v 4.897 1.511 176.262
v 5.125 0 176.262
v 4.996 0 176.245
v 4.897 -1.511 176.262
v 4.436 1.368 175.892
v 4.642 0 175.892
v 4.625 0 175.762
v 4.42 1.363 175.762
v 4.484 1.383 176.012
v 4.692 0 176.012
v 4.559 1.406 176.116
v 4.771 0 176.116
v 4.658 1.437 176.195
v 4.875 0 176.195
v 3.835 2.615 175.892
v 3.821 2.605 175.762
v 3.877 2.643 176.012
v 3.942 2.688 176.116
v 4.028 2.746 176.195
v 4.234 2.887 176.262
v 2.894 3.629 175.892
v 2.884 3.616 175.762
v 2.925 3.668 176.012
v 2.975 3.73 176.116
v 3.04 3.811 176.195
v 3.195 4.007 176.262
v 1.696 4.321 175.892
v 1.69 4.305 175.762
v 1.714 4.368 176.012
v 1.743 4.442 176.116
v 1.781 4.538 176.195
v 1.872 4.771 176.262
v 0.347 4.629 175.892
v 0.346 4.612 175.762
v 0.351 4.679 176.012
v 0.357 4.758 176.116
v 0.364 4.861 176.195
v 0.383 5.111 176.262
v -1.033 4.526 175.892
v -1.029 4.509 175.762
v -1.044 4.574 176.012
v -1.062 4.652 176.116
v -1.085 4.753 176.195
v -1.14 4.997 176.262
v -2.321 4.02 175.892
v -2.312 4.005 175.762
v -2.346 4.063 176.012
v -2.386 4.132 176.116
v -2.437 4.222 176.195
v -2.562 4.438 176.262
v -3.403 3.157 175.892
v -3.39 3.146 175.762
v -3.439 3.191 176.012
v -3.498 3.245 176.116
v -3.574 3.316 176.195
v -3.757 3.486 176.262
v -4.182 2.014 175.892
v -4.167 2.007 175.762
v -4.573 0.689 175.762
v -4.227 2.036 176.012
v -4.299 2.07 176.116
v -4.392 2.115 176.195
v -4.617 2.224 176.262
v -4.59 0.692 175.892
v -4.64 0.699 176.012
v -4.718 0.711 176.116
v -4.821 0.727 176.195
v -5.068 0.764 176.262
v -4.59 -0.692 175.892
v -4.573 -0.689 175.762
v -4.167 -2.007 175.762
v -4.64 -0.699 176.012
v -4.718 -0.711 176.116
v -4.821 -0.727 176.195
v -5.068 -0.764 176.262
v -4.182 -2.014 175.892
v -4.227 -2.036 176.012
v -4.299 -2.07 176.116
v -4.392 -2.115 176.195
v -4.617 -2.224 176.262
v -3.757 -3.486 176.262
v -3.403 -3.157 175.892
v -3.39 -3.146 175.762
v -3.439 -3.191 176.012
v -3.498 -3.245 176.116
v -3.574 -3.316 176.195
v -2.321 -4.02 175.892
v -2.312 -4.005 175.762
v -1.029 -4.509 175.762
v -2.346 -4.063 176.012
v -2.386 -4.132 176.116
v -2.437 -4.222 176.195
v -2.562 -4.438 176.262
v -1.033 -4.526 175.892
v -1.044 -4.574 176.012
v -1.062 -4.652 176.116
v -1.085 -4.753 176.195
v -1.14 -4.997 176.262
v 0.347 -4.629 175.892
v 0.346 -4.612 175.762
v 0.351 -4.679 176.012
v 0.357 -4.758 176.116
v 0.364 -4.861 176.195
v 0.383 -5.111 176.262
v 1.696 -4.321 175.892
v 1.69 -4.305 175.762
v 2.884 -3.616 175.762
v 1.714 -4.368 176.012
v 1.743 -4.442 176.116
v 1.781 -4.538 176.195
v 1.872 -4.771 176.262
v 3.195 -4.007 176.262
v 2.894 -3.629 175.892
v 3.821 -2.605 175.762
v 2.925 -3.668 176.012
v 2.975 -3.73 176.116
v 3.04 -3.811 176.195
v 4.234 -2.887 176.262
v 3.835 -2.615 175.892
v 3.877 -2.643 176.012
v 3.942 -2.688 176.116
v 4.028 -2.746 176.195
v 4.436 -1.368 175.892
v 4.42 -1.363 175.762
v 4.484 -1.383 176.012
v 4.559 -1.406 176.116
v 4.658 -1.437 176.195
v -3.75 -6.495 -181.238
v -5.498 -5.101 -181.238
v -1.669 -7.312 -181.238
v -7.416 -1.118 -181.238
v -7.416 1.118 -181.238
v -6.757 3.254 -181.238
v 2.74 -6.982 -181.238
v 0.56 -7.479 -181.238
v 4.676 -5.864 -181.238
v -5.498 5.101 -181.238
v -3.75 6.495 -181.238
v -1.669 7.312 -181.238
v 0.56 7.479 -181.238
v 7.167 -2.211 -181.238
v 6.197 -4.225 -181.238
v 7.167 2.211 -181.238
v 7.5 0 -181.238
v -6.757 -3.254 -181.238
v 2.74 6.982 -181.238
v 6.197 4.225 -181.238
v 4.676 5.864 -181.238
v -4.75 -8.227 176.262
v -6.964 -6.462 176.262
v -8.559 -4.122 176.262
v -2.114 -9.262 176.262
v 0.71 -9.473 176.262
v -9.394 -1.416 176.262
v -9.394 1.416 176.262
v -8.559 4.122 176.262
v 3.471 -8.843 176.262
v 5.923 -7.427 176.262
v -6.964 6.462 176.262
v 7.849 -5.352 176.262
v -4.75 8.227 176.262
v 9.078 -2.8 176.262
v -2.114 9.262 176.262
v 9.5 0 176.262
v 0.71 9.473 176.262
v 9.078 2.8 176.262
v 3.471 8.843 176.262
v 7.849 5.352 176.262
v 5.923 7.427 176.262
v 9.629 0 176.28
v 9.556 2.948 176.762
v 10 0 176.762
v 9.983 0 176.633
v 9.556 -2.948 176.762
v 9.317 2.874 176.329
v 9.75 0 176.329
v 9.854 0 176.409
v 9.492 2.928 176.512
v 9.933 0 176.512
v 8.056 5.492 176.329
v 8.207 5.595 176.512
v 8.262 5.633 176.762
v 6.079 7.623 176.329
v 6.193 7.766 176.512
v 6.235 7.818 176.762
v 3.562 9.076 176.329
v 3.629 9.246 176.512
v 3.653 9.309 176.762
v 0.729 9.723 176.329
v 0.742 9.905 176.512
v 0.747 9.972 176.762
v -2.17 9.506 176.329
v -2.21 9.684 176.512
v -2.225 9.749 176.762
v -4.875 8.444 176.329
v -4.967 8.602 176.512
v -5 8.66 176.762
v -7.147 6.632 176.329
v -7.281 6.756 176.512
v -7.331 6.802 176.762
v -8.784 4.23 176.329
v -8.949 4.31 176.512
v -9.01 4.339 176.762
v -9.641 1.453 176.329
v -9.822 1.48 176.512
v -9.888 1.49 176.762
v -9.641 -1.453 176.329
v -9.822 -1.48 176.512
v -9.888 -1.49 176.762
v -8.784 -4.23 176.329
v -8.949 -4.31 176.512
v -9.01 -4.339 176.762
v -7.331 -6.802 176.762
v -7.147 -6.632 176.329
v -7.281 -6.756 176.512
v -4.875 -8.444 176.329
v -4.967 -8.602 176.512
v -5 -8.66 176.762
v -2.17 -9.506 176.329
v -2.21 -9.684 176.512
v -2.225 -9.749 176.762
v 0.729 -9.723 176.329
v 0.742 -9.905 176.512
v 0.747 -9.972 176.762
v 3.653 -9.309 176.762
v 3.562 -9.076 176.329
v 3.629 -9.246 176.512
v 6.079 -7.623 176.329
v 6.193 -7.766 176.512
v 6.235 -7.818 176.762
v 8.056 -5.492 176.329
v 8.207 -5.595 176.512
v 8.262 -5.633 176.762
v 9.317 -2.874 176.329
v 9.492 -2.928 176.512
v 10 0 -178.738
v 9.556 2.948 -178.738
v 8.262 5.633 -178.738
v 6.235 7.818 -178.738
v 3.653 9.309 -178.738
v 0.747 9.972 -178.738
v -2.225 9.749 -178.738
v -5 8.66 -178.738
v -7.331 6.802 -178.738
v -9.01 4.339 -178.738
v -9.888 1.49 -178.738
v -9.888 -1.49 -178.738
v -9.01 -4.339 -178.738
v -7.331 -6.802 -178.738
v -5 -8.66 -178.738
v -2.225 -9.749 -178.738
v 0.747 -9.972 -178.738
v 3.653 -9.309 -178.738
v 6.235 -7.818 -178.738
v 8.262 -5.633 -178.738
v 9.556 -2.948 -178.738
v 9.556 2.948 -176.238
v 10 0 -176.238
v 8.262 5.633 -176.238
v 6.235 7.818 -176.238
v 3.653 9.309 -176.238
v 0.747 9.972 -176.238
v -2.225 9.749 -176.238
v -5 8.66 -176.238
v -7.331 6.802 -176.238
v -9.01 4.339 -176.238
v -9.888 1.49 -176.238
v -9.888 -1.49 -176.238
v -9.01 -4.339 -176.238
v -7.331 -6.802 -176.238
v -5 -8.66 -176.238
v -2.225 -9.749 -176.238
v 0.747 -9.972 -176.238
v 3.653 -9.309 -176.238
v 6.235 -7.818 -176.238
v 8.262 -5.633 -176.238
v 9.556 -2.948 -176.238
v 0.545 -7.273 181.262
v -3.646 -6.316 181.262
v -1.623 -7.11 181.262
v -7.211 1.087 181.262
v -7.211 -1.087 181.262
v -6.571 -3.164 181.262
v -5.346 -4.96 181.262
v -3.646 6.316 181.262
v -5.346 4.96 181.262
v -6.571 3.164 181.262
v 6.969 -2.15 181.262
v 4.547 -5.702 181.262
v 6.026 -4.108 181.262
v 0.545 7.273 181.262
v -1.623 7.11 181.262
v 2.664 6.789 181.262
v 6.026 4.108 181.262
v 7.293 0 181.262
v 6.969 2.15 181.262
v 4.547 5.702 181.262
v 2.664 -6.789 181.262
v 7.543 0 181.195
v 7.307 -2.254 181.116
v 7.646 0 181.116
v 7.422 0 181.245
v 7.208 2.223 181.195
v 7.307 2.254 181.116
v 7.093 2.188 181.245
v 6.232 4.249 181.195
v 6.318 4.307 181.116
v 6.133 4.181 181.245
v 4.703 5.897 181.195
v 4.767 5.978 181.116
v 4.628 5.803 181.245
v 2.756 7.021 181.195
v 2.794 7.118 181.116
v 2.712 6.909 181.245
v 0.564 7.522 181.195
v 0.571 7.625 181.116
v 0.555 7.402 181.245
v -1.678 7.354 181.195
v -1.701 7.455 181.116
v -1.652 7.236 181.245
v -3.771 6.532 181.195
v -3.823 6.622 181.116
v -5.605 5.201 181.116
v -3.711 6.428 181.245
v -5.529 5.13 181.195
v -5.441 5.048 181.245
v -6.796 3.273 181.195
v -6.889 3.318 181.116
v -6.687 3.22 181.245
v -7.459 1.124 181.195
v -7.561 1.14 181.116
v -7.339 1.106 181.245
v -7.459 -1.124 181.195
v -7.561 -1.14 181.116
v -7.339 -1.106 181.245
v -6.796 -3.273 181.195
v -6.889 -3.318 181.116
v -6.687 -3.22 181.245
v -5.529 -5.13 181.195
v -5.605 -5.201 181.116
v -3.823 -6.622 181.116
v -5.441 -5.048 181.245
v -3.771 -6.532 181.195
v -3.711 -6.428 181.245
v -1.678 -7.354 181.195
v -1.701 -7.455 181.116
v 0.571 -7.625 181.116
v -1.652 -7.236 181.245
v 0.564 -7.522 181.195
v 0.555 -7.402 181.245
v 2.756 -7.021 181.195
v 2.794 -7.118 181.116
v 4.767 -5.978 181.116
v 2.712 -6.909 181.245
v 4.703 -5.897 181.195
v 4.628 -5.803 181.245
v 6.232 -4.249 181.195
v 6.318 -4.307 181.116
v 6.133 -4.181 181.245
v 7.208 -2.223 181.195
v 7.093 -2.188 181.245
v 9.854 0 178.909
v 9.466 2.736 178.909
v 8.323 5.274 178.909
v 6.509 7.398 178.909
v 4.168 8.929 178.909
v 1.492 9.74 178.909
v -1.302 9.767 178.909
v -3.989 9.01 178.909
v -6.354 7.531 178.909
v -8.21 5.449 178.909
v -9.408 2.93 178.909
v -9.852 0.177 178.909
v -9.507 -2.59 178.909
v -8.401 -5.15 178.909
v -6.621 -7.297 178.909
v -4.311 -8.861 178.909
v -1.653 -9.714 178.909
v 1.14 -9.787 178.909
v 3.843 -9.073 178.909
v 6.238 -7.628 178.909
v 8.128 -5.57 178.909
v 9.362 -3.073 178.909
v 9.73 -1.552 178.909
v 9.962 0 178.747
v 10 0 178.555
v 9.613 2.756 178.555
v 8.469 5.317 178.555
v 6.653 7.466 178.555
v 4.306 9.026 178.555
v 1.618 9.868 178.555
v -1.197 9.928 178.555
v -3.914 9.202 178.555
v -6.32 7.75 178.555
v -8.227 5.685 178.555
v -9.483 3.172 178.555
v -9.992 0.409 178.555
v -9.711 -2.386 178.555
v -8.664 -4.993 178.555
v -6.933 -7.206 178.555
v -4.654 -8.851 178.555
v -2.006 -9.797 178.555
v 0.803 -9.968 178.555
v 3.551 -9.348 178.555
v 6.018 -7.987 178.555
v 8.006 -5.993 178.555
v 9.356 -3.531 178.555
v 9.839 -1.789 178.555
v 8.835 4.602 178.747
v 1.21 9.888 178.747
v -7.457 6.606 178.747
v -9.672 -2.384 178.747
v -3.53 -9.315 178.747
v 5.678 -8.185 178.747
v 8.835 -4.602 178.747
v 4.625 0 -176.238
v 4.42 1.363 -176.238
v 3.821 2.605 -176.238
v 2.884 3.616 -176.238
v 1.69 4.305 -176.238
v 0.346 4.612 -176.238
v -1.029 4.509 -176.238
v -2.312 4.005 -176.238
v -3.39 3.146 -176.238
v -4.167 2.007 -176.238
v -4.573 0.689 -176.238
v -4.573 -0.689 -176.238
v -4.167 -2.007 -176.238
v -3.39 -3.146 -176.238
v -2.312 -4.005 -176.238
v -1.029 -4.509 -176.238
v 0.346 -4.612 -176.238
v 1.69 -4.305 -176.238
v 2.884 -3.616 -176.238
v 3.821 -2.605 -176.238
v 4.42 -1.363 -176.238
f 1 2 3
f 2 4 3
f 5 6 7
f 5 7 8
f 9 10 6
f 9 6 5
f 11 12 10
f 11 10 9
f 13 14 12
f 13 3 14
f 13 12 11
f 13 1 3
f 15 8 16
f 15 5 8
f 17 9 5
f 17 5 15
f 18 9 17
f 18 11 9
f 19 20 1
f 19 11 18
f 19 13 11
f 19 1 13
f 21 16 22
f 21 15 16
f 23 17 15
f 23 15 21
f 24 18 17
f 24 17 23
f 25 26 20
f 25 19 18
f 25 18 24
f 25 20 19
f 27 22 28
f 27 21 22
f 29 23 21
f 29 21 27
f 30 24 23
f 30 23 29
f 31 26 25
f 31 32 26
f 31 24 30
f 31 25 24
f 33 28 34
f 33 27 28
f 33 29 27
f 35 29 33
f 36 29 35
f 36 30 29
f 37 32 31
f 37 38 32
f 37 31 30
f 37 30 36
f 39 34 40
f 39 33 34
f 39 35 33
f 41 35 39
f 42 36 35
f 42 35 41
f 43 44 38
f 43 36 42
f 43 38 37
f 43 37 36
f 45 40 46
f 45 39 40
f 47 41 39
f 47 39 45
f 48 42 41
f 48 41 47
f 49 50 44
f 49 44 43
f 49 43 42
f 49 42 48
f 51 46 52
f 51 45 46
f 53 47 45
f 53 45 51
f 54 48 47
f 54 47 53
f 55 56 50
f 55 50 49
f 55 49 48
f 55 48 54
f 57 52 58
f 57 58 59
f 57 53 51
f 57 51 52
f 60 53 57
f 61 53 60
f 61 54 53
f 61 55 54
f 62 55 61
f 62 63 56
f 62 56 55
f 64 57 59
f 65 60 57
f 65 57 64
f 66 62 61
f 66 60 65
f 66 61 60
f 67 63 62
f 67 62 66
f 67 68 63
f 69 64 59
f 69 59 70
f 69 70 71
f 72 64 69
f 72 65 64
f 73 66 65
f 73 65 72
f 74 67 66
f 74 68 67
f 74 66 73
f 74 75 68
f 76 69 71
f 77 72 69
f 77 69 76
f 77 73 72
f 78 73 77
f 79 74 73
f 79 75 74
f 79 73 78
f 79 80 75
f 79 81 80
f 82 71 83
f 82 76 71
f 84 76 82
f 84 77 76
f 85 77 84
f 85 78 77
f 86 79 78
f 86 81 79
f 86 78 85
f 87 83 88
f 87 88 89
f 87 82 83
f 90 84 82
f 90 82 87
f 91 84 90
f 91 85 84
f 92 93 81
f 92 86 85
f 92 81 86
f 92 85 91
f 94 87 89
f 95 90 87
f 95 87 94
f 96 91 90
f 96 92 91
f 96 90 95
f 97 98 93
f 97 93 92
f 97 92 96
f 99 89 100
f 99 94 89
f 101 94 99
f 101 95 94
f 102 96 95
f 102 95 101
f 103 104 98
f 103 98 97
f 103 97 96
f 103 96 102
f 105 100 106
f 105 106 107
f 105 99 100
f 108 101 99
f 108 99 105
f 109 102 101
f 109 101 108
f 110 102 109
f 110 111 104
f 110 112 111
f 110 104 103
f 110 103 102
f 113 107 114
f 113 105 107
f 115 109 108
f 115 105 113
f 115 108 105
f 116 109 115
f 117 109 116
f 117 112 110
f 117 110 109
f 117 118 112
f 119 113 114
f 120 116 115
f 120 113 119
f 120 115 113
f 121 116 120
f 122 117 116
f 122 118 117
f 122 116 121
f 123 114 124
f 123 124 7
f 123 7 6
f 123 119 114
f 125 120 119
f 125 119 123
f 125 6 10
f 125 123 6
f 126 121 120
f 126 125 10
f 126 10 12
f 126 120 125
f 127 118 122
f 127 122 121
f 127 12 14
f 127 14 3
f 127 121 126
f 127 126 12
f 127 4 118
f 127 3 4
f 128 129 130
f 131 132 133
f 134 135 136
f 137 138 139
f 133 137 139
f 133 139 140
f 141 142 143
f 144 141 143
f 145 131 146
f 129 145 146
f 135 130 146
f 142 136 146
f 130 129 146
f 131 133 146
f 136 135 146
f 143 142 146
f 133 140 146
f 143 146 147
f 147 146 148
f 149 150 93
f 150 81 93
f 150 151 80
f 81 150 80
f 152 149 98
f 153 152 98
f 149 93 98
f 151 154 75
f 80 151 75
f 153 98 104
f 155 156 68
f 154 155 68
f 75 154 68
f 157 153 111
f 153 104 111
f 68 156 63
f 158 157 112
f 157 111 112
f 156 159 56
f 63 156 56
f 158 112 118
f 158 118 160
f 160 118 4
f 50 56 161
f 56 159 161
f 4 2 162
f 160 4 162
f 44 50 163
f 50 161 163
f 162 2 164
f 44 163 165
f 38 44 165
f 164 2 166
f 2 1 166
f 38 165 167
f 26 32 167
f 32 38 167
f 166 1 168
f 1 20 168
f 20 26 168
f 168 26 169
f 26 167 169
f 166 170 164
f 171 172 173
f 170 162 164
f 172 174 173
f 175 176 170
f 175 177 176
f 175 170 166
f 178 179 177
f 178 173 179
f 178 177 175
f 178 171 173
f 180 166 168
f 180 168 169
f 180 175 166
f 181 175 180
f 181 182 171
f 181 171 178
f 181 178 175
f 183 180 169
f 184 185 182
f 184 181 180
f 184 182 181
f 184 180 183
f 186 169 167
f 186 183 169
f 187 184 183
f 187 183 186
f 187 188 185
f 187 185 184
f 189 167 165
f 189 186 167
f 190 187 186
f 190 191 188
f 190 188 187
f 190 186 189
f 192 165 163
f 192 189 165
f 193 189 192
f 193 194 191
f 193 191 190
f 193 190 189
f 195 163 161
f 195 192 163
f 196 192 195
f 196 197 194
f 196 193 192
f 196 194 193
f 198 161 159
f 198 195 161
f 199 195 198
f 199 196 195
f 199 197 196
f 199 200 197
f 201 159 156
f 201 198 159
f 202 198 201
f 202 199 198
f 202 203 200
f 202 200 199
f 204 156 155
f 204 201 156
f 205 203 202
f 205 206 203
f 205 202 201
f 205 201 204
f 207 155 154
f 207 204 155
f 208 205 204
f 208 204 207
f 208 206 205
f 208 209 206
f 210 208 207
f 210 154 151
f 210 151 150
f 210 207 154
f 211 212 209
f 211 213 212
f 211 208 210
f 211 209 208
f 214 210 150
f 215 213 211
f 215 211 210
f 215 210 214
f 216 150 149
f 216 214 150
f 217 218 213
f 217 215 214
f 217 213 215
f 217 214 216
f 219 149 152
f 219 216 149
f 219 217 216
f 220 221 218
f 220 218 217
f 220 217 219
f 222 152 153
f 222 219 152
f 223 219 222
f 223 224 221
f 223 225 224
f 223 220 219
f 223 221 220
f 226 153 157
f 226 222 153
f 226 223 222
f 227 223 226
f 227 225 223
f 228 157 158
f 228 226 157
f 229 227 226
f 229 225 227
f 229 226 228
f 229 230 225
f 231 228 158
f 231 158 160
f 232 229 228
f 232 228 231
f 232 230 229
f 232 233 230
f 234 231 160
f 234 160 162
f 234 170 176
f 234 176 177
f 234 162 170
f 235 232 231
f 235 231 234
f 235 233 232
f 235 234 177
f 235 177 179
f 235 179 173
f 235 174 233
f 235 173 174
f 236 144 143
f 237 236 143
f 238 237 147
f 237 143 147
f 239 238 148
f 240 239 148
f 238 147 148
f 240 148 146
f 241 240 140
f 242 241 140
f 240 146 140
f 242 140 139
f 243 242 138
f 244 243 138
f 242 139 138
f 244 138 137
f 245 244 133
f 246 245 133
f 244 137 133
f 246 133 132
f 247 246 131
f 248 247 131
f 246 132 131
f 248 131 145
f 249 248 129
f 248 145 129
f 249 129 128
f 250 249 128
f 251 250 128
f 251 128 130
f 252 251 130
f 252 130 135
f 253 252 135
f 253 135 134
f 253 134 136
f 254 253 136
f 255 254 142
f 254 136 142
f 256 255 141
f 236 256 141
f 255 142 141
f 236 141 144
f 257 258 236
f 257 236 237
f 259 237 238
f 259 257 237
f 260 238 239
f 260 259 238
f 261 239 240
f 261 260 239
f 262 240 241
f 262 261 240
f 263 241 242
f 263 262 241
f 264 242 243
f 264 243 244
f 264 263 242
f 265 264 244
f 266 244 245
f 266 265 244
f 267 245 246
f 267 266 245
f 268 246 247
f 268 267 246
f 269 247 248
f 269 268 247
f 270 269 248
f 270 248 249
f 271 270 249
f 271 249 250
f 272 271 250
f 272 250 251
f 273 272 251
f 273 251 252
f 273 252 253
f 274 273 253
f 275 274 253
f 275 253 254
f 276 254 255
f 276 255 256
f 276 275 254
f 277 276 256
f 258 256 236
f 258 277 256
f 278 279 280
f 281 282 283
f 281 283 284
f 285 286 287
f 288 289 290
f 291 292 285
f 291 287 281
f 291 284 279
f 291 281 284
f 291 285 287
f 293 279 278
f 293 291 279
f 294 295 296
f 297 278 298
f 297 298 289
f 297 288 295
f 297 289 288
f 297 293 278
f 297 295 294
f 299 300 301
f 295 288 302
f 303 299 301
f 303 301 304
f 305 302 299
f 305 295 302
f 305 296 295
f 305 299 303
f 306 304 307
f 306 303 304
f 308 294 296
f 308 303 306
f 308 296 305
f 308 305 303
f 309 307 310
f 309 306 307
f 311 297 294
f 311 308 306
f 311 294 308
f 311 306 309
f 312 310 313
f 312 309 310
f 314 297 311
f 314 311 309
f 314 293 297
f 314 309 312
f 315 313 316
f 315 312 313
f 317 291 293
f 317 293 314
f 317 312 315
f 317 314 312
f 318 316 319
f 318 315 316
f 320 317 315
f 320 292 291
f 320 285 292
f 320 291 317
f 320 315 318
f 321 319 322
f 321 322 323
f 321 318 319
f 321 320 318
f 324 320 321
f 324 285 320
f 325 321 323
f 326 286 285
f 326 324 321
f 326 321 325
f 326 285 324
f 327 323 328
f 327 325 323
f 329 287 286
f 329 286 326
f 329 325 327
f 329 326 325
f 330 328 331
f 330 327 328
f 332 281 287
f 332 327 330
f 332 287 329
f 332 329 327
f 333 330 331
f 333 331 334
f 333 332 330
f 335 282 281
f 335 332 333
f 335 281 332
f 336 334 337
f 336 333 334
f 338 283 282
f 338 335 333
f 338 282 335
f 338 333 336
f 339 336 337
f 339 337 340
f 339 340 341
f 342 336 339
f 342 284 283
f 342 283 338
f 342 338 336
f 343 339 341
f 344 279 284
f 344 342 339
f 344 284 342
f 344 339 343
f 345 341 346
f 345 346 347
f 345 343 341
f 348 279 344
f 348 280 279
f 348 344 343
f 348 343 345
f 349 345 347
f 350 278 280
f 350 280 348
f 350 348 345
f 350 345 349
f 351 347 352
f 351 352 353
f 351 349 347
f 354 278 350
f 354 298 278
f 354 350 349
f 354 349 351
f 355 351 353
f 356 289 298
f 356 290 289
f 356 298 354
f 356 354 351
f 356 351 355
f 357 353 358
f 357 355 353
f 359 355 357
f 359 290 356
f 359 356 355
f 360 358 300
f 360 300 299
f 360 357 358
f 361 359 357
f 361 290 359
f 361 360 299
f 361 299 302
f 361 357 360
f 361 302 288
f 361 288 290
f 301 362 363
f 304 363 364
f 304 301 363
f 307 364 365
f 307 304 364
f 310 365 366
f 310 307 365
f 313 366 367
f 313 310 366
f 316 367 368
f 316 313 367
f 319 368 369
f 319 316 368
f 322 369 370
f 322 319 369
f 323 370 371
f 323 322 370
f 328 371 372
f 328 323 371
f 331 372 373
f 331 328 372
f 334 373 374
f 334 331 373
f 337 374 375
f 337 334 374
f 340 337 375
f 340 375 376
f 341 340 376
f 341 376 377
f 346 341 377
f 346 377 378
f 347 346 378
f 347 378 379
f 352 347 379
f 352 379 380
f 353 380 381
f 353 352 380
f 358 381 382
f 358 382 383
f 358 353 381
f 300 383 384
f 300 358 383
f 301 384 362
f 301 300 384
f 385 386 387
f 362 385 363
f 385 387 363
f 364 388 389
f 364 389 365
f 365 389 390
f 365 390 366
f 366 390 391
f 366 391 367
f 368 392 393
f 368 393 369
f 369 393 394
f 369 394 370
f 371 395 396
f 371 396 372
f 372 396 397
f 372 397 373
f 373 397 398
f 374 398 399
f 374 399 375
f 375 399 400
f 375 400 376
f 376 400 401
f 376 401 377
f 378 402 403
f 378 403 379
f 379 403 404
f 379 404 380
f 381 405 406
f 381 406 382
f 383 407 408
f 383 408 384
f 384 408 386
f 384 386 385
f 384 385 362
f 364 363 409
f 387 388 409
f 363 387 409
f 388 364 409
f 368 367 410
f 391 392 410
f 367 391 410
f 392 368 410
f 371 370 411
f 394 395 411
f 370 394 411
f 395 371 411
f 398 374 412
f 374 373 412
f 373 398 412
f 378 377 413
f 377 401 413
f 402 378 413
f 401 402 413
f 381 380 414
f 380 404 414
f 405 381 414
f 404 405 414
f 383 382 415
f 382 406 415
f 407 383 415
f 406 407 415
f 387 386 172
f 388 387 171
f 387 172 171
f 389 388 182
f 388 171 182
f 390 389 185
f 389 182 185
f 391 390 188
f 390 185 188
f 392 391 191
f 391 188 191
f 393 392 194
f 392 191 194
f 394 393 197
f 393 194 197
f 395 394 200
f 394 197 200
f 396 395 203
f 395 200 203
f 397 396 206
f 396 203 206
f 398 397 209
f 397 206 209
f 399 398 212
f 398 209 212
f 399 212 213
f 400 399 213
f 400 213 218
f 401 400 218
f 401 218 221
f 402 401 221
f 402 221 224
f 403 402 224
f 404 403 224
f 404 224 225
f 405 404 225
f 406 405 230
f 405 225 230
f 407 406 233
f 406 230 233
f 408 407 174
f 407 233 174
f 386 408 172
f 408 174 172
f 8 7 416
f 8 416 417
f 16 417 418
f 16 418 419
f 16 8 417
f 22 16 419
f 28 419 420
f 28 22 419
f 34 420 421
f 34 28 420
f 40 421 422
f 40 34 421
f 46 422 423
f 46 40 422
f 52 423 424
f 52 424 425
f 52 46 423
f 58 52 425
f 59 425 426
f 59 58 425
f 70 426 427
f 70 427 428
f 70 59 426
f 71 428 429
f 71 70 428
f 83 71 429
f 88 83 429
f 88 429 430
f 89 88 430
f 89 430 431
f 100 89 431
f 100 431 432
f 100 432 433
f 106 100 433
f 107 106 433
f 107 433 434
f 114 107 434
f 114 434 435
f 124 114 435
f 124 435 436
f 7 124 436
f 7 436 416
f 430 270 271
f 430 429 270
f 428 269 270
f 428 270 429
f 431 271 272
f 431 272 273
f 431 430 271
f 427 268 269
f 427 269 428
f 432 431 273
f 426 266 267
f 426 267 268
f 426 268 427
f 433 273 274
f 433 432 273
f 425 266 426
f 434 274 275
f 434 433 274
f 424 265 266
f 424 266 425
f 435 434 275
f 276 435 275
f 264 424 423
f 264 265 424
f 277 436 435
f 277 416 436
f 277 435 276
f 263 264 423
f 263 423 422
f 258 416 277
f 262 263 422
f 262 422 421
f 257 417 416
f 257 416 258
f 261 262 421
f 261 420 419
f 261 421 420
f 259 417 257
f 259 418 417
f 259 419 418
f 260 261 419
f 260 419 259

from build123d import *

# Parameters (mm, degrees)
SKETCH1_R           = 0.925
BOSS_EXTRUDE1_DEPTH = 35.25
SKETCH2_R           = 2
BOSS_EXTRUDE2_DEPTH = 1
CHAMFER1_SIZE       = 0.5
FILLET1_R           = 0.1
SCALE1_SCALE        = 5


with BuildPart() as part:
    # Sketch1 → Boss-Extrude1 (new body)
    with BuildSketch(Plane.XY):
        Circle(SKETCH1_R)
    extrude(amount=BOSS_EXTRUDE1_DEPTH)

    # Sketch2 → Boss-Extrude2 (add)
    with BuildSketch(Plane.XY.offset(35.25)):
        Circle(SKETCH2_R)
    extrude(amount=BOSS_EXTRUDE2_DEPTH)

    # Chamfer1
    chamfer1_edges = [part.edges().sort_by_distance(p)[0] for p in [
        (-2, 0, 36.25),
    ]]
    chamfer(chamfer1_edges, length=CHAMFER1_SIZE)

    # Mirror1: part across plane


with BuildPart() as part_1:
    add(part.part)
    add(part.part.mirror(Plane.XY))

    # Fillet1
    fillet1_edges = [part_1.edges().sort_by_distance(p)[0] for p in [
        (-1.5, 0, 36.25),
        (-2, 0, 35.75),
        (-0.925, 0, 35.25),
        (-2, 0, 35.25),
    ]]
    fillet(fillet1_edges, radius=FILLET1_R)


with BuildPart() as part_2:
    # Scale1: scaled about (-2.8e-08, 0, -0.003118898)
    add(part_1.part.scale(SCALE1_SCALE).moved(Location((1.12e-07, 0, 0.012475592))))


solid = part_2.part
